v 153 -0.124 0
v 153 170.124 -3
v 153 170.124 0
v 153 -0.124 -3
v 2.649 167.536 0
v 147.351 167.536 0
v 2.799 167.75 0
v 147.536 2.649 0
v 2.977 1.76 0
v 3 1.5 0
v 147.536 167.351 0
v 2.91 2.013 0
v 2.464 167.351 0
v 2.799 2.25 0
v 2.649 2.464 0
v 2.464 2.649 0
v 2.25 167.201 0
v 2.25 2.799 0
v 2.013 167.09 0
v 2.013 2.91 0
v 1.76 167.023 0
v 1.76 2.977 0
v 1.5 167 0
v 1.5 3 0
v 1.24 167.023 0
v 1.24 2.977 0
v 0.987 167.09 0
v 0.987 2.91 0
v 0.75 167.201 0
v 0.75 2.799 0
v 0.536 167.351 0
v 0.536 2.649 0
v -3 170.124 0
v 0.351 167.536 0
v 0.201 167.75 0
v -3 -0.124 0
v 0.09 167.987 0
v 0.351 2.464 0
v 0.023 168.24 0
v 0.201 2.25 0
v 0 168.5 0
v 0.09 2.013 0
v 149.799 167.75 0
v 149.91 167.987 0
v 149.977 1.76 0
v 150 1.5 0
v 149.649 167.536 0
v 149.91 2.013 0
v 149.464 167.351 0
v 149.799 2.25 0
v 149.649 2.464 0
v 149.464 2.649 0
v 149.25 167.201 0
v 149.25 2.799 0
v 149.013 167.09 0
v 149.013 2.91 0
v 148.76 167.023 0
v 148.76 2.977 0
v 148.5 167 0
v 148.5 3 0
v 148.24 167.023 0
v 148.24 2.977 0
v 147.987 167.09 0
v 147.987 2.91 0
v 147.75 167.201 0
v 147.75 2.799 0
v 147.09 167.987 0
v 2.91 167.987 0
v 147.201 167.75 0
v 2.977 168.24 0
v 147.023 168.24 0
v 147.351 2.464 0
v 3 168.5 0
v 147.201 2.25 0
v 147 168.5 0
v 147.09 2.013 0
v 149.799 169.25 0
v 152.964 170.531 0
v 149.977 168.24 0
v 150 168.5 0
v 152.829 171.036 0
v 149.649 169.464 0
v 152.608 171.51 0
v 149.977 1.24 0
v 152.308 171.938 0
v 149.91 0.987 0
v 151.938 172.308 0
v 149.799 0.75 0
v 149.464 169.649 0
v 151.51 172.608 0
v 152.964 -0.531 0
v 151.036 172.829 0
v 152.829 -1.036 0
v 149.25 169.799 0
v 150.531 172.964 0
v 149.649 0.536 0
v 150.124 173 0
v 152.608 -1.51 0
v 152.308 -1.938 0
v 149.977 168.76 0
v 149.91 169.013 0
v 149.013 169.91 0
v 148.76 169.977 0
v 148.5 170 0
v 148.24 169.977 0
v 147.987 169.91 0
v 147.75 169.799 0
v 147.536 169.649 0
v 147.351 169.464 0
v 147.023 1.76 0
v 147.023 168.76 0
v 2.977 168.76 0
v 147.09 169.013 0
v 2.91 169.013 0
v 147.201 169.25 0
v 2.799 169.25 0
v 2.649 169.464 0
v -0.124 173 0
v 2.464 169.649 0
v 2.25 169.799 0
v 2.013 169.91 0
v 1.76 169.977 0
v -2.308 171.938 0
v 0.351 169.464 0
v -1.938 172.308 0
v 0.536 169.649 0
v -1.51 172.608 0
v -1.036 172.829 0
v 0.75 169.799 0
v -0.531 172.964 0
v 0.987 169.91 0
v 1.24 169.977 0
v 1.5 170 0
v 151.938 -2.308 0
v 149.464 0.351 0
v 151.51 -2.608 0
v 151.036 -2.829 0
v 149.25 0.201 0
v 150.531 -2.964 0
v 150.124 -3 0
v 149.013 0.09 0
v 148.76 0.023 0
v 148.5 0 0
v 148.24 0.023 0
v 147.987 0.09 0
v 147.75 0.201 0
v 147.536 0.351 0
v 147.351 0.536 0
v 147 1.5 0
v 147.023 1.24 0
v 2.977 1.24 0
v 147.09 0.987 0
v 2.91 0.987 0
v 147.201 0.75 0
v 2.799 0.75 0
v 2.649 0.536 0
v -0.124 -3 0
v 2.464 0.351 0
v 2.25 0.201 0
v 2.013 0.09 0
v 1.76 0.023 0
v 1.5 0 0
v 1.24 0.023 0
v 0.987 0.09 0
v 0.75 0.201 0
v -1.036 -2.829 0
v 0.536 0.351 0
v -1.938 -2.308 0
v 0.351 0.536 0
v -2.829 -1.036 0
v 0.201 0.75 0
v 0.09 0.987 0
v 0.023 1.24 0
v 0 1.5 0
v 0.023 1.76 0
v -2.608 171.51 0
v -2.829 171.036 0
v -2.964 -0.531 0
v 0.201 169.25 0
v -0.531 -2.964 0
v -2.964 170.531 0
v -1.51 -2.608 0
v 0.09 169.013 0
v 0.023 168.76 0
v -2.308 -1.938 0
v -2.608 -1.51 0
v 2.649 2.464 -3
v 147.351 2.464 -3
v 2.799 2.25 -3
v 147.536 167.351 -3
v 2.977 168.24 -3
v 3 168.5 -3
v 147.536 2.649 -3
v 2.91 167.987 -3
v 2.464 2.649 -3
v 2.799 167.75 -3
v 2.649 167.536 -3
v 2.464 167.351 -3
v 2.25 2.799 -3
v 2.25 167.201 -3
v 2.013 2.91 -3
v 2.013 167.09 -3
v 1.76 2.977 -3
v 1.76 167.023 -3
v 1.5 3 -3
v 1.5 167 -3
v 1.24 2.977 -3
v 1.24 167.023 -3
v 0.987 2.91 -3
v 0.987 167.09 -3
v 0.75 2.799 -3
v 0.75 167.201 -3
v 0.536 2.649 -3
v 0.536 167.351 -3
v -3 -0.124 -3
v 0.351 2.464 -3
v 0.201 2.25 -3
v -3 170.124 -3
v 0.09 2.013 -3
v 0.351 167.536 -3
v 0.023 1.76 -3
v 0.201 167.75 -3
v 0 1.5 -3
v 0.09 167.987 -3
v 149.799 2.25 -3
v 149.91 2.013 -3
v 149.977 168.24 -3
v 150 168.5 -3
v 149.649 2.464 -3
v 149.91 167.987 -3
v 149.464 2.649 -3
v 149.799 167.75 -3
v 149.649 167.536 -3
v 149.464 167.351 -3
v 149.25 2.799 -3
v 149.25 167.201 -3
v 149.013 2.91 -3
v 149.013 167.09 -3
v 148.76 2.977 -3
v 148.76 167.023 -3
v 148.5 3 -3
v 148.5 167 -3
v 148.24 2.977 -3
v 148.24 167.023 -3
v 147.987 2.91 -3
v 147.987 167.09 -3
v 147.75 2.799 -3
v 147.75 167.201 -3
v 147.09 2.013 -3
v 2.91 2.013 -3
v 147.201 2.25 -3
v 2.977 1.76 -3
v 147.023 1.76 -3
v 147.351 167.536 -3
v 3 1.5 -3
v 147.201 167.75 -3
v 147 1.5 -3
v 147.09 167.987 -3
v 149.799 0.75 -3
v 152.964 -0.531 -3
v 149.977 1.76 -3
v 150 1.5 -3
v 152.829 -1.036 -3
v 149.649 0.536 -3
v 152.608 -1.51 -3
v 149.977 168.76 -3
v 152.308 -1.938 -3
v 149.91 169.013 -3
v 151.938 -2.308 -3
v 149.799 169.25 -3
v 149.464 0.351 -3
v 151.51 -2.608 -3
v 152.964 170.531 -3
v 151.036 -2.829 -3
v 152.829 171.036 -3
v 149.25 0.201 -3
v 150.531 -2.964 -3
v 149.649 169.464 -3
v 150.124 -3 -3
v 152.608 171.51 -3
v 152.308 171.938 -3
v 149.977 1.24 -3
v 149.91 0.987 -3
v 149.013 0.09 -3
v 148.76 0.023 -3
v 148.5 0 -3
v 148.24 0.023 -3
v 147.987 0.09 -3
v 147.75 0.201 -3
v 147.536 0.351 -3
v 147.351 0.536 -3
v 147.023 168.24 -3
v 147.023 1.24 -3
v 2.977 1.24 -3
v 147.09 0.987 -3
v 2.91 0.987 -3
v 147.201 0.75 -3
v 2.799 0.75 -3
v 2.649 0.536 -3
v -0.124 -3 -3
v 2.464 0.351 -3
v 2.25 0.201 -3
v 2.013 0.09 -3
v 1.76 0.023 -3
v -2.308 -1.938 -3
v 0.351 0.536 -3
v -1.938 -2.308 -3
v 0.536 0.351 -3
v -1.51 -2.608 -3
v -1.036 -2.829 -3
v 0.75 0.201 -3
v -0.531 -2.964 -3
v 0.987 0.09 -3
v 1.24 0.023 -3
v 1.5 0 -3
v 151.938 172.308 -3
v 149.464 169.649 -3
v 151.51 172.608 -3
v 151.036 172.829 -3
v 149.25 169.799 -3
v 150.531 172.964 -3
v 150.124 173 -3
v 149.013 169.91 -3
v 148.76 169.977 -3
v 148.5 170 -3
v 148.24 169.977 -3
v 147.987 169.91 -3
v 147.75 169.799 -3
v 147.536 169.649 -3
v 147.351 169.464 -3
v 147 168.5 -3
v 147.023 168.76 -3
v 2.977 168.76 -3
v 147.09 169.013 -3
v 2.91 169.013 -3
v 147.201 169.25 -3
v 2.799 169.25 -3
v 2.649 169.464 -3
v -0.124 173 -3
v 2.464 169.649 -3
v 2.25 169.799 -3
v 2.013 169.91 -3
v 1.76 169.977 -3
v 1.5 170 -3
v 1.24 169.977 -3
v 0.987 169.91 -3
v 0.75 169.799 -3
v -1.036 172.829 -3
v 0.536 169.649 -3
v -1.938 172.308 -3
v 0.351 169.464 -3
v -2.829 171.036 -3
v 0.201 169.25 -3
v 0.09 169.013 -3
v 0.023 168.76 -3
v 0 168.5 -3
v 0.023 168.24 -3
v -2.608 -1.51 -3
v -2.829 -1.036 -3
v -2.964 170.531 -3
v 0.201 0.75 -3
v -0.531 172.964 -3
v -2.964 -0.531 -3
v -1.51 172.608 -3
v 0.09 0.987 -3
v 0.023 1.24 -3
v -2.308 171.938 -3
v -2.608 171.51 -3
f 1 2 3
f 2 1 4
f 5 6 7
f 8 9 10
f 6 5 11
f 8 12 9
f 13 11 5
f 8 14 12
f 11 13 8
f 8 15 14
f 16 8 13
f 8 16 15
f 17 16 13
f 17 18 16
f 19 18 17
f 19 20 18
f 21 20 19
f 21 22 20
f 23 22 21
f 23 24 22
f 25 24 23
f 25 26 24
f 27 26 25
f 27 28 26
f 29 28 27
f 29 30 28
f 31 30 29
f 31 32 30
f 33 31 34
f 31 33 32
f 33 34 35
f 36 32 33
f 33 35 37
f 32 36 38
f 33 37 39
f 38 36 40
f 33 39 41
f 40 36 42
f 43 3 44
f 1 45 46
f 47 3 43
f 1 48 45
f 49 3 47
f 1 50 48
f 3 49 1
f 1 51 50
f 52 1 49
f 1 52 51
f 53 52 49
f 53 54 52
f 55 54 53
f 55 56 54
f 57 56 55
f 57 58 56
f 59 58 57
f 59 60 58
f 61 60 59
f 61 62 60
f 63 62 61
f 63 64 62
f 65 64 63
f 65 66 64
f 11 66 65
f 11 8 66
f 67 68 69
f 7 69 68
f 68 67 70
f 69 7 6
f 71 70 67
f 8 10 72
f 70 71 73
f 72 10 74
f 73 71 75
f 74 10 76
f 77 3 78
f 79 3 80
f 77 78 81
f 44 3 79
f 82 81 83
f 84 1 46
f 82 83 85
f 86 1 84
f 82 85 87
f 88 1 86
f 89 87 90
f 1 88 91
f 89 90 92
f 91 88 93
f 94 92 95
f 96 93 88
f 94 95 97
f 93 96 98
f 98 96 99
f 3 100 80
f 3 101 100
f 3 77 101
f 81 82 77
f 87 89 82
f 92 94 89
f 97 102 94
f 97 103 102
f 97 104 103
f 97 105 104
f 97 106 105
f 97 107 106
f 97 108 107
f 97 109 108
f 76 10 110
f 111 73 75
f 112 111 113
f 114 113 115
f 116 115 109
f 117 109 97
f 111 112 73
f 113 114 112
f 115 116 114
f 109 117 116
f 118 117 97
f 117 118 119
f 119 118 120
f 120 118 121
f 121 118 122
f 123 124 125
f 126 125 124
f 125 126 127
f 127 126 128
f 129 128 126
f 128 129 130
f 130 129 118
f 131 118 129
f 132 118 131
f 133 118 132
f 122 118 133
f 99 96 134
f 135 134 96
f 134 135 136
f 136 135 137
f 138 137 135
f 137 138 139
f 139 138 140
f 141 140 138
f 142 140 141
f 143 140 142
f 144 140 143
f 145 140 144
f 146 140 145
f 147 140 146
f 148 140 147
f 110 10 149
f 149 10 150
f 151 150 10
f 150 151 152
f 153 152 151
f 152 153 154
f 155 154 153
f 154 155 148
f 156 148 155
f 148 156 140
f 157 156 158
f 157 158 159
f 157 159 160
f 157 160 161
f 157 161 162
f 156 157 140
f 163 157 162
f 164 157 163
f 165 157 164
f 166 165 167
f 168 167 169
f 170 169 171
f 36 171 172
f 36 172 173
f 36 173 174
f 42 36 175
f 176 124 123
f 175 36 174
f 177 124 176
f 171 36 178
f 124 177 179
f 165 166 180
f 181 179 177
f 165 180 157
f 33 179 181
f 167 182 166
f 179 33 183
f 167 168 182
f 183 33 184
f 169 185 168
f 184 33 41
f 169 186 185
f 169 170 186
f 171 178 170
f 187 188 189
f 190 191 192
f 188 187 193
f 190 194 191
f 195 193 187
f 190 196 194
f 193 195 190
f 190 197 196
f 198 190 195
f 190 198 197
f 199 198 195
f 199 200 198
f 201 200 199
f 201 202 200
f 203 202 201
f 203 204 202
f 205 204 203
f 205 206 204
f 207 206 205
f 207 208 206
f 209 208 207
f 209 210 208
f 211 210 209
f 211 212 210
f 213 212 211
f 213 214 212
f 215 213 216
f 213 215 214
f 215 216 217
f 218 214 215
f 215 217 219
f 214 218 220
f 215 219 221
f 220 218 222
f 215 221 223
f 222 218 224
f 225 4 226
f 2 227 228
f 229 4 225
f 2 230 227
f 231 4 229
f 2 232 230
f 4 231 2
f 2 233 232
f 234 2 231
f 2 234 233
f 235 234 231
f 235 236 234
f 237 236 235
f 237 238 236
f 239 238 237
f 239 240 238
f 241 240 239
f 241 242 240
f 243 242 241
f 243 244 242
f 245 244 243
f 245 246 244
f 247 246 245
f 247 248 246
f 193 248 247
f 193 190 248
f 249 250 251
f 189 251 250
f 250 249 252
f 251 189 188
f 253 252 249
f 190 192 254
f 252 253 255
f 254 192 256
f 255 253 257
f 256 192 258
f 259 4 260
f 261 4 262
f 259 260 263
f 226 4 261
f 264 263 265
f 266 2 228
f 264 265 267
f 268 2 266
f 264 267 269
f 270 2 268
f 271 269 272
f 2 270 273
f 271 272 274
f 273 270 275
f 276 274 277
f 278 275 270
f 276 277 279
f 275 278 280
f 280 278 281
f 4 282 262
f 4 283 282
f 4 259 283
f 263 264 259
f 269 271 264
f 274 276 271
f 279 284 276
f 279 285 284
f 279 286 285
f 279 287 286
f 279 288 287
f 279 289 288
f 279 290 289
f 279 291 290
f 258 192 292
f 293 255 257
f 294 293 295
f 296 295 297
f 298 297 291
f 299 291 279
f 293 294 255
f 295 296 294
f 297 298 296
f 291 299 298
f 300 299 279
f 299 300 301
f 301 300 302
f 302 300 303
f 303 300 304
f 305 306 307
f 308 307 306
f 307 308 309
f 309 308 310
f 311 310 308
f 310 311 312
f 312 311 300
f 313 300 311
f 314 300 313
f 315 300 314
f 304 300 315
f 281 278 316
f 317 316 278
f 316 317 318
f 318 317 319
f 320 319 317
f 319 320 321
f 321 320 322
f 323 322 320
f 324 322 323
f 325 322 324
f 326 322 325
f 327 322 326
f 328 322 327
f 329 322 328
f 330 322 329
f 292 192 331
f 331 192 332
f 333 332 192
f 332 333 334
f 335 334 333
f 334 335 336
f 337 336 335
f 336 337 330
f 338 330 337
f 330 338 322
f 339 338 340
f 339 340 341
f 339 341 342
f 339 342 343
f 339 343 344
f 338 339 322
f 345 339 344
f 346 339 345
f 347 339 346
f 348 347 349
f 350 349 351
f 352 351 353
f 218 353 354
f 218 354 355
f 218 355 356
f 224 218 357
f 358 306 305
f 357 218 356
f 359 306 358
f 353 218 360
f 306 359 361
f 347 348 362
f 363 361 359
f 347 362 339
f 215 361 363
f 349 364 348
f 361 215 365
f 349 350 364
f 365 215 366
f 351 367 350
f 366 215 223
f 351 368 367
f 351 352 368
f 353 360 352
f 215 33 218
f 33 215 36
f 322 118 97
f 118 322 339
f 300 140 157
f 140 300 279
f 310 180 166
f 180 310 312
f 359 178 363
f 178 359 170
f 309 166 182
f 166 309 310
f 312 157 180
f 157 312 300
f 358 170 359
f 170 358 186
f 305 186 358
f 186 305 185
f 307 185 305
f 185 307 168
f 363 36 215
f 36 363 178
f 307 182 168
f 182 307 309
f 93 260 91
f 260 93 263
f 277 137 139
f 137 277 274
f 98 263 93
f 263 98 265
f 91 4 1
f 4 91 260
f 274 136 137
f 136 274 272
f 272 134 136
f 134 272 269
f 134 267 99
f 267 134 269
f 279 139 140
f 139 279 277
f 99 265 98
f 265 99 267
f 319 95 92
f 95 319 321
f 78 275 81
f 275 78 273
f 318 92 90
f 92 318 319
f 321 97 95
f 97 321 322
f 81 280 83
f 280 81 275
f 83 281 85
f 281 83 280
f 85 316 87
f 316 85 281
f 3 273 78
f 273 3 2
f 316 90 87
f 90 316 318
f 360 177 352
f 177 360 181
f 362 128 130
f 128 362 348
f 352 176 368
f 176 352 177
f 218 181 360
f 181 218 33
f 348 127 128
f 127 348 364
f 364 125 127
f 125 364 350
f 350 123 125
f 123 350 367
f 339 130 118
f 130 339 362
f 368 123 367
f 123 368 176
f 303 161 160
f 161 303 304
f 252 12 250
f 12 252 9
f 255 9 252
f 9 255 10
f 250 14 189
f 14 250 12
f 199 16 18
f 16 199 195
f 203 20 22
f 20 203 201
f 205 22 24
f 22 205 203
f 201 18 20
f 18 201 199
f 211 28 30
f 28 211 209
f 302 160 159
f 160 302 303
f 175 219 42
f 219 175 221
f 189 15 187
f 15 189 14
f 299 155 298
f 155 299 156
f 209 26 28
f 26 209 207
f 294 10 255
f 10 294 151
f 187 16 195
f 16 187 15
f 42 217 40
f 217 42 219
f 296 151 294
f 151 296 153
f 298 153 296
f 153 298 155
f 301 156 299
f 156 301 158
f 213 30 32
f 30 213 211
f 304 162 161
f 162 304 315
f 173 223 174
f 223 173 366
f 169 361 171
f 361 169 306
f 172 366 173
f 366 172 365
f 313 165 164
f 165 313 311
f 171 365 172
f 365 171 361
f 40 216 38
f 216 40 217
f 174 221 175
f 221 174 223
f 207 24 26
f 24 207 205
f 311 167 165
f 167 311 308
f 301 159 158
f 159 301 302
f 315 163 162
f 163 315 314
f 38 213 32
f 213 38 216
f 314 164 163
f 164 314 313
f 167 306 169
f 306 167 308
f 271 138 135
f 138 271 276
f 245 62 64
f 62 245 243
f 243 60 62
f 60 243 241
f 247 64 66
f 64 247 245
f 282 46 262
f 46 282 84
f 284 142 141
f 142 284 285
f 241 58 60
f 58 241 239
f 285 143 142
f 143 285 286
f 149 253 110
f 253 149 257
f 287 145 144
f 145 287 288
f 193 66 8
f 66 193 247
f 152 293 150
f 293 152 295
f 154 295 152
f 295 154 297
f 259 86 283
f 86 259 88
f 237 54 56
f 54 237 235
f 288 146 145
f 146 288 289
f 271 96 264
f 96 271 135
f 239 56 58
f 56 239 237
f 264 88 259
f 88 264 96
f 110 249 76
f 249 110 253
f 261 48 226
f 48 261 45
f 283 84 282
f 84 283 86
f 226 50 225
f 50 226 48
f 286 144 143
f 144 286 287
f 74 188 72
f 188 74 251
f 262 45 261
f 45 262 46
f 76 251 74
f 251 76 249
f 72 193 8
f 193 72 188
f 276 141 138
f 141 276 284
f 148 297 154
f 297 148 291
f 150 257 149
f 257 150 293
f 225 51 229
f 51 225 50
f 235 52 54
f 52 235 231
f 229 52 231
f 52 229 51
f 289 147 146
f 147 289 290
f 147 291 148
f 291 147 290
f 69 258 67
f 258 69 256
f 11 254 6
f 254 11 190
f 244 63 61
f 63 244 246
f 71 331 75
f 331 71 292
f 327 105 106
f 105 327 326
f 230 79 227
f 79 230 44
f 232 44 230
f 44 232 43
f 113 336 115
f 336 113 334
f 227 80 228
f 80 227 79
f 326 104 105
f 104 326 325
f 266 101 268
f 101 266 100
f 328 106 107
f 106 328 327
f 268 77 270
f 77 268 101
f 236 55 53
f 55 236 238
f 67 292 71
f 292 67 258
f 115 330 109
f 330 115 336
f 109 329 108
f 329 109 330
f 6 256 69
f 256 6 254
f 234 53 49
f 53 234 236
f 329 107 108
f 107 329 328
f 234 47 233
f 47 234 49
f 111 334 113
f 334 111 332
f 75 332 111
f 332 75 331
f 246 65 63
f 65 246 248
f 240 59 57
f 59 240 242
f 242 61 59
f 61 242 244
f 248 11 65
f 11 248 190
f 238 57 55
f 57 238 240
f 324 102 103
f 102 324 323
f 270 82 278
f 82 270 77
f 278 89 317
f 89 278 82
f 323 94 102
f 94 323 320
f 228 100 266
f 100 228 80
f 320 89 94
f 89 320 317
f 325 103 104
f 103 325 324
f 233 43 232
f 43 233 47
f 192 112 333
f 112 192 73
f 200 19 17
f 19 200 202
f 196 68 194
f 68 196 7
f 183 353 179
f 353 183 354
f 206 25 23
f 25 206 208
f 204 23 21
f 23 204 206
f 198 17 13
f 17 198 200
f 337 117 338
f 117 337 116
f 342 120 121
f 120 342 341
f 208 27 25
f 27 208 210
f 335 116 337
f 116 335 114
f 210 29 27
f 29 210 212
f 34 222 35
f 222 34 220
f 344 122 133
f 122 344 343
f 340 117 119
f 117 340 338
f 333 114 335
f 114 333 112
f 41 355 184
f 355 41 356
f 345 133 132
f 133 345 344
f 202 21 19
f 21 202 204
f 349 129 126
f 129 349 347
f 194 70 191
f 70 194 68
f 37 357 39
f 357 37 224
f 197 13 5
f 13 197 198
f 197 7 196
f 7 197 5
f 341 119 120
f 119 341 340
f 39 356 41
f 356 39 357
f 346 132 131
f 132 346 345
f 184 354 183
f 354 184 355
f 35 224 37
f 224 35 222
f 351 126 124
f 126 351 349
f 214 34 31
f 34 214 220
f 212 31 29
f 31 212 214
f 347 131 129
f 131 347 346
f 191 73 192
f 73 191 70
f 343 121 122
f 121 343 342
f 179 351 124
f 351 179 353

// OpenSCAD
// file: common.scad
include <MCAD/units.scad>;

$fn = 36;

// Size of the enclosure
useful_size = [ 15 * cm, 17 * cm, 9 * cm ];

// Thickness of the walls
wall_size = 3 * mm;

// Edges are soften with this radius
round_radius = 3 * mm;

// Vent Parameters (hexagon structure)
vent_alveolus_size = 8 * mm;
vent_margin = 1 * mm;
vent_xstep = cos(30) * (vent_margin + sqrt(3) * vent_alveolus_size / 2);
vent_ystep = sin(30) * (vent_margin + sqrt(3) * vent_alveolus_size / 2);

// Screw hole diameter for the four screws holding the cover
cover_screw_hole_diameter = 2.5 * mm;

module box(useful_size, wall_size) {
  difference() {
    translate([ -wall_size, -wall_size, -wall_size ])
      cube([ useful_size.x + 2 * wall_size, useful_size.y + 2 * wall_size, useful_size.z + wall_size ]);
    translate([ 0, 0, epsilon])
      cube([ useful_size.x, useful_size.y, useful_size.z ]);
  }
}

module rounded_corner(round_radius, length) {
  difference() {
    cube([ round_radius, round_radius, length ]);
    translate([ round_radius, round_radius, -epsilon ])
      cylinder(r=round_radius, h=length + 2 * epsilon);
  }
}

module at_four_corners(box) {
  translate([ box[0].x, box[0].y, 0 ])
      children();
  translate([ box[1].x, box[0].y, 0 ])
    rotate([ 0, 0, 90 ])
      children();
  translate([ box[1].x, box[1].y, 0 ])
    rotate([ 0, 0, 180 ])
      children();
  translate([ box[0].x, box[1].y, 0 ])
    rotate([ 0, 0, 270 ])
      children();
}

module rounded_box(useful_size, wall_size, round_radius, cover_screw_hole_diameter = 0) {
  difference() {
    union() {
      box(useful_size, wall_size);
      if (cover_screw_hole_diameter == 0) {
        at_four_corners([ [ 0, 0 ], useful_size ])
          rounded_corner(round_radius, useful_size.z);
      } else {
        at_four_corners([ [ 0, 0 ], useful_size ]) {
          reinforcement_size = wall_size + cover_screw_hole_diameter;
          difference() {
            cube([ reinforcement_size, reinforcement_size, useful_size.z ]);
            translate([ reinforcement_size + epsilon, reinforcement_size + epsilon, -epsilon ])
              rotate([ 0, 0, 180 ])
                rounded_corner(round_radius, useful_size.z + 2 * epsilon);
            translate([ cover_screw_hole_diameter / 2, cover_screw_hole_diameter / 2, epsilon ])
            cylinder(d = cover_screw_hole_diameter, h = useful_size.z + epsilon);
          }
          translate([ 0, reinforcement_size, 0 ])
            rounded_corner(round_radius, useful_size.z);
          translate([ reinforcement_size, 0, 0 ])
            rounded_corner(round_radius, useful_size.z);
        }
      }
    }
    at_four_corners([ [ -wall_size, -wall_size ], useful_size + [ wall_size, wall_size ] ])
      translate([ -epsilon, -epsilon, -wall_size - epsilon ])
        rounded_corner(round_radius, useful_size.z + wall_size + 2 * epsilon);
  }
}
// main file
include <MCAD/units.scad>;
include <common.scad>

difference() {
  rounded_box([ useful_size.x, useful_size.y, 0 ], wall_size, round_radius);
  at_four_corners([ [ 0, 0 ], useful_size ]) {
    translate([ (cover_screw_hole_diameter + 0.5) / 2 , (cover_screw_hole_diameter + 0.5) / 2 , -wall_size - epsilon ])
      cylinder(d = cover_screw_hole_diameter + 0.5, h = wall_size + 2 * epsilon);
  }
}
